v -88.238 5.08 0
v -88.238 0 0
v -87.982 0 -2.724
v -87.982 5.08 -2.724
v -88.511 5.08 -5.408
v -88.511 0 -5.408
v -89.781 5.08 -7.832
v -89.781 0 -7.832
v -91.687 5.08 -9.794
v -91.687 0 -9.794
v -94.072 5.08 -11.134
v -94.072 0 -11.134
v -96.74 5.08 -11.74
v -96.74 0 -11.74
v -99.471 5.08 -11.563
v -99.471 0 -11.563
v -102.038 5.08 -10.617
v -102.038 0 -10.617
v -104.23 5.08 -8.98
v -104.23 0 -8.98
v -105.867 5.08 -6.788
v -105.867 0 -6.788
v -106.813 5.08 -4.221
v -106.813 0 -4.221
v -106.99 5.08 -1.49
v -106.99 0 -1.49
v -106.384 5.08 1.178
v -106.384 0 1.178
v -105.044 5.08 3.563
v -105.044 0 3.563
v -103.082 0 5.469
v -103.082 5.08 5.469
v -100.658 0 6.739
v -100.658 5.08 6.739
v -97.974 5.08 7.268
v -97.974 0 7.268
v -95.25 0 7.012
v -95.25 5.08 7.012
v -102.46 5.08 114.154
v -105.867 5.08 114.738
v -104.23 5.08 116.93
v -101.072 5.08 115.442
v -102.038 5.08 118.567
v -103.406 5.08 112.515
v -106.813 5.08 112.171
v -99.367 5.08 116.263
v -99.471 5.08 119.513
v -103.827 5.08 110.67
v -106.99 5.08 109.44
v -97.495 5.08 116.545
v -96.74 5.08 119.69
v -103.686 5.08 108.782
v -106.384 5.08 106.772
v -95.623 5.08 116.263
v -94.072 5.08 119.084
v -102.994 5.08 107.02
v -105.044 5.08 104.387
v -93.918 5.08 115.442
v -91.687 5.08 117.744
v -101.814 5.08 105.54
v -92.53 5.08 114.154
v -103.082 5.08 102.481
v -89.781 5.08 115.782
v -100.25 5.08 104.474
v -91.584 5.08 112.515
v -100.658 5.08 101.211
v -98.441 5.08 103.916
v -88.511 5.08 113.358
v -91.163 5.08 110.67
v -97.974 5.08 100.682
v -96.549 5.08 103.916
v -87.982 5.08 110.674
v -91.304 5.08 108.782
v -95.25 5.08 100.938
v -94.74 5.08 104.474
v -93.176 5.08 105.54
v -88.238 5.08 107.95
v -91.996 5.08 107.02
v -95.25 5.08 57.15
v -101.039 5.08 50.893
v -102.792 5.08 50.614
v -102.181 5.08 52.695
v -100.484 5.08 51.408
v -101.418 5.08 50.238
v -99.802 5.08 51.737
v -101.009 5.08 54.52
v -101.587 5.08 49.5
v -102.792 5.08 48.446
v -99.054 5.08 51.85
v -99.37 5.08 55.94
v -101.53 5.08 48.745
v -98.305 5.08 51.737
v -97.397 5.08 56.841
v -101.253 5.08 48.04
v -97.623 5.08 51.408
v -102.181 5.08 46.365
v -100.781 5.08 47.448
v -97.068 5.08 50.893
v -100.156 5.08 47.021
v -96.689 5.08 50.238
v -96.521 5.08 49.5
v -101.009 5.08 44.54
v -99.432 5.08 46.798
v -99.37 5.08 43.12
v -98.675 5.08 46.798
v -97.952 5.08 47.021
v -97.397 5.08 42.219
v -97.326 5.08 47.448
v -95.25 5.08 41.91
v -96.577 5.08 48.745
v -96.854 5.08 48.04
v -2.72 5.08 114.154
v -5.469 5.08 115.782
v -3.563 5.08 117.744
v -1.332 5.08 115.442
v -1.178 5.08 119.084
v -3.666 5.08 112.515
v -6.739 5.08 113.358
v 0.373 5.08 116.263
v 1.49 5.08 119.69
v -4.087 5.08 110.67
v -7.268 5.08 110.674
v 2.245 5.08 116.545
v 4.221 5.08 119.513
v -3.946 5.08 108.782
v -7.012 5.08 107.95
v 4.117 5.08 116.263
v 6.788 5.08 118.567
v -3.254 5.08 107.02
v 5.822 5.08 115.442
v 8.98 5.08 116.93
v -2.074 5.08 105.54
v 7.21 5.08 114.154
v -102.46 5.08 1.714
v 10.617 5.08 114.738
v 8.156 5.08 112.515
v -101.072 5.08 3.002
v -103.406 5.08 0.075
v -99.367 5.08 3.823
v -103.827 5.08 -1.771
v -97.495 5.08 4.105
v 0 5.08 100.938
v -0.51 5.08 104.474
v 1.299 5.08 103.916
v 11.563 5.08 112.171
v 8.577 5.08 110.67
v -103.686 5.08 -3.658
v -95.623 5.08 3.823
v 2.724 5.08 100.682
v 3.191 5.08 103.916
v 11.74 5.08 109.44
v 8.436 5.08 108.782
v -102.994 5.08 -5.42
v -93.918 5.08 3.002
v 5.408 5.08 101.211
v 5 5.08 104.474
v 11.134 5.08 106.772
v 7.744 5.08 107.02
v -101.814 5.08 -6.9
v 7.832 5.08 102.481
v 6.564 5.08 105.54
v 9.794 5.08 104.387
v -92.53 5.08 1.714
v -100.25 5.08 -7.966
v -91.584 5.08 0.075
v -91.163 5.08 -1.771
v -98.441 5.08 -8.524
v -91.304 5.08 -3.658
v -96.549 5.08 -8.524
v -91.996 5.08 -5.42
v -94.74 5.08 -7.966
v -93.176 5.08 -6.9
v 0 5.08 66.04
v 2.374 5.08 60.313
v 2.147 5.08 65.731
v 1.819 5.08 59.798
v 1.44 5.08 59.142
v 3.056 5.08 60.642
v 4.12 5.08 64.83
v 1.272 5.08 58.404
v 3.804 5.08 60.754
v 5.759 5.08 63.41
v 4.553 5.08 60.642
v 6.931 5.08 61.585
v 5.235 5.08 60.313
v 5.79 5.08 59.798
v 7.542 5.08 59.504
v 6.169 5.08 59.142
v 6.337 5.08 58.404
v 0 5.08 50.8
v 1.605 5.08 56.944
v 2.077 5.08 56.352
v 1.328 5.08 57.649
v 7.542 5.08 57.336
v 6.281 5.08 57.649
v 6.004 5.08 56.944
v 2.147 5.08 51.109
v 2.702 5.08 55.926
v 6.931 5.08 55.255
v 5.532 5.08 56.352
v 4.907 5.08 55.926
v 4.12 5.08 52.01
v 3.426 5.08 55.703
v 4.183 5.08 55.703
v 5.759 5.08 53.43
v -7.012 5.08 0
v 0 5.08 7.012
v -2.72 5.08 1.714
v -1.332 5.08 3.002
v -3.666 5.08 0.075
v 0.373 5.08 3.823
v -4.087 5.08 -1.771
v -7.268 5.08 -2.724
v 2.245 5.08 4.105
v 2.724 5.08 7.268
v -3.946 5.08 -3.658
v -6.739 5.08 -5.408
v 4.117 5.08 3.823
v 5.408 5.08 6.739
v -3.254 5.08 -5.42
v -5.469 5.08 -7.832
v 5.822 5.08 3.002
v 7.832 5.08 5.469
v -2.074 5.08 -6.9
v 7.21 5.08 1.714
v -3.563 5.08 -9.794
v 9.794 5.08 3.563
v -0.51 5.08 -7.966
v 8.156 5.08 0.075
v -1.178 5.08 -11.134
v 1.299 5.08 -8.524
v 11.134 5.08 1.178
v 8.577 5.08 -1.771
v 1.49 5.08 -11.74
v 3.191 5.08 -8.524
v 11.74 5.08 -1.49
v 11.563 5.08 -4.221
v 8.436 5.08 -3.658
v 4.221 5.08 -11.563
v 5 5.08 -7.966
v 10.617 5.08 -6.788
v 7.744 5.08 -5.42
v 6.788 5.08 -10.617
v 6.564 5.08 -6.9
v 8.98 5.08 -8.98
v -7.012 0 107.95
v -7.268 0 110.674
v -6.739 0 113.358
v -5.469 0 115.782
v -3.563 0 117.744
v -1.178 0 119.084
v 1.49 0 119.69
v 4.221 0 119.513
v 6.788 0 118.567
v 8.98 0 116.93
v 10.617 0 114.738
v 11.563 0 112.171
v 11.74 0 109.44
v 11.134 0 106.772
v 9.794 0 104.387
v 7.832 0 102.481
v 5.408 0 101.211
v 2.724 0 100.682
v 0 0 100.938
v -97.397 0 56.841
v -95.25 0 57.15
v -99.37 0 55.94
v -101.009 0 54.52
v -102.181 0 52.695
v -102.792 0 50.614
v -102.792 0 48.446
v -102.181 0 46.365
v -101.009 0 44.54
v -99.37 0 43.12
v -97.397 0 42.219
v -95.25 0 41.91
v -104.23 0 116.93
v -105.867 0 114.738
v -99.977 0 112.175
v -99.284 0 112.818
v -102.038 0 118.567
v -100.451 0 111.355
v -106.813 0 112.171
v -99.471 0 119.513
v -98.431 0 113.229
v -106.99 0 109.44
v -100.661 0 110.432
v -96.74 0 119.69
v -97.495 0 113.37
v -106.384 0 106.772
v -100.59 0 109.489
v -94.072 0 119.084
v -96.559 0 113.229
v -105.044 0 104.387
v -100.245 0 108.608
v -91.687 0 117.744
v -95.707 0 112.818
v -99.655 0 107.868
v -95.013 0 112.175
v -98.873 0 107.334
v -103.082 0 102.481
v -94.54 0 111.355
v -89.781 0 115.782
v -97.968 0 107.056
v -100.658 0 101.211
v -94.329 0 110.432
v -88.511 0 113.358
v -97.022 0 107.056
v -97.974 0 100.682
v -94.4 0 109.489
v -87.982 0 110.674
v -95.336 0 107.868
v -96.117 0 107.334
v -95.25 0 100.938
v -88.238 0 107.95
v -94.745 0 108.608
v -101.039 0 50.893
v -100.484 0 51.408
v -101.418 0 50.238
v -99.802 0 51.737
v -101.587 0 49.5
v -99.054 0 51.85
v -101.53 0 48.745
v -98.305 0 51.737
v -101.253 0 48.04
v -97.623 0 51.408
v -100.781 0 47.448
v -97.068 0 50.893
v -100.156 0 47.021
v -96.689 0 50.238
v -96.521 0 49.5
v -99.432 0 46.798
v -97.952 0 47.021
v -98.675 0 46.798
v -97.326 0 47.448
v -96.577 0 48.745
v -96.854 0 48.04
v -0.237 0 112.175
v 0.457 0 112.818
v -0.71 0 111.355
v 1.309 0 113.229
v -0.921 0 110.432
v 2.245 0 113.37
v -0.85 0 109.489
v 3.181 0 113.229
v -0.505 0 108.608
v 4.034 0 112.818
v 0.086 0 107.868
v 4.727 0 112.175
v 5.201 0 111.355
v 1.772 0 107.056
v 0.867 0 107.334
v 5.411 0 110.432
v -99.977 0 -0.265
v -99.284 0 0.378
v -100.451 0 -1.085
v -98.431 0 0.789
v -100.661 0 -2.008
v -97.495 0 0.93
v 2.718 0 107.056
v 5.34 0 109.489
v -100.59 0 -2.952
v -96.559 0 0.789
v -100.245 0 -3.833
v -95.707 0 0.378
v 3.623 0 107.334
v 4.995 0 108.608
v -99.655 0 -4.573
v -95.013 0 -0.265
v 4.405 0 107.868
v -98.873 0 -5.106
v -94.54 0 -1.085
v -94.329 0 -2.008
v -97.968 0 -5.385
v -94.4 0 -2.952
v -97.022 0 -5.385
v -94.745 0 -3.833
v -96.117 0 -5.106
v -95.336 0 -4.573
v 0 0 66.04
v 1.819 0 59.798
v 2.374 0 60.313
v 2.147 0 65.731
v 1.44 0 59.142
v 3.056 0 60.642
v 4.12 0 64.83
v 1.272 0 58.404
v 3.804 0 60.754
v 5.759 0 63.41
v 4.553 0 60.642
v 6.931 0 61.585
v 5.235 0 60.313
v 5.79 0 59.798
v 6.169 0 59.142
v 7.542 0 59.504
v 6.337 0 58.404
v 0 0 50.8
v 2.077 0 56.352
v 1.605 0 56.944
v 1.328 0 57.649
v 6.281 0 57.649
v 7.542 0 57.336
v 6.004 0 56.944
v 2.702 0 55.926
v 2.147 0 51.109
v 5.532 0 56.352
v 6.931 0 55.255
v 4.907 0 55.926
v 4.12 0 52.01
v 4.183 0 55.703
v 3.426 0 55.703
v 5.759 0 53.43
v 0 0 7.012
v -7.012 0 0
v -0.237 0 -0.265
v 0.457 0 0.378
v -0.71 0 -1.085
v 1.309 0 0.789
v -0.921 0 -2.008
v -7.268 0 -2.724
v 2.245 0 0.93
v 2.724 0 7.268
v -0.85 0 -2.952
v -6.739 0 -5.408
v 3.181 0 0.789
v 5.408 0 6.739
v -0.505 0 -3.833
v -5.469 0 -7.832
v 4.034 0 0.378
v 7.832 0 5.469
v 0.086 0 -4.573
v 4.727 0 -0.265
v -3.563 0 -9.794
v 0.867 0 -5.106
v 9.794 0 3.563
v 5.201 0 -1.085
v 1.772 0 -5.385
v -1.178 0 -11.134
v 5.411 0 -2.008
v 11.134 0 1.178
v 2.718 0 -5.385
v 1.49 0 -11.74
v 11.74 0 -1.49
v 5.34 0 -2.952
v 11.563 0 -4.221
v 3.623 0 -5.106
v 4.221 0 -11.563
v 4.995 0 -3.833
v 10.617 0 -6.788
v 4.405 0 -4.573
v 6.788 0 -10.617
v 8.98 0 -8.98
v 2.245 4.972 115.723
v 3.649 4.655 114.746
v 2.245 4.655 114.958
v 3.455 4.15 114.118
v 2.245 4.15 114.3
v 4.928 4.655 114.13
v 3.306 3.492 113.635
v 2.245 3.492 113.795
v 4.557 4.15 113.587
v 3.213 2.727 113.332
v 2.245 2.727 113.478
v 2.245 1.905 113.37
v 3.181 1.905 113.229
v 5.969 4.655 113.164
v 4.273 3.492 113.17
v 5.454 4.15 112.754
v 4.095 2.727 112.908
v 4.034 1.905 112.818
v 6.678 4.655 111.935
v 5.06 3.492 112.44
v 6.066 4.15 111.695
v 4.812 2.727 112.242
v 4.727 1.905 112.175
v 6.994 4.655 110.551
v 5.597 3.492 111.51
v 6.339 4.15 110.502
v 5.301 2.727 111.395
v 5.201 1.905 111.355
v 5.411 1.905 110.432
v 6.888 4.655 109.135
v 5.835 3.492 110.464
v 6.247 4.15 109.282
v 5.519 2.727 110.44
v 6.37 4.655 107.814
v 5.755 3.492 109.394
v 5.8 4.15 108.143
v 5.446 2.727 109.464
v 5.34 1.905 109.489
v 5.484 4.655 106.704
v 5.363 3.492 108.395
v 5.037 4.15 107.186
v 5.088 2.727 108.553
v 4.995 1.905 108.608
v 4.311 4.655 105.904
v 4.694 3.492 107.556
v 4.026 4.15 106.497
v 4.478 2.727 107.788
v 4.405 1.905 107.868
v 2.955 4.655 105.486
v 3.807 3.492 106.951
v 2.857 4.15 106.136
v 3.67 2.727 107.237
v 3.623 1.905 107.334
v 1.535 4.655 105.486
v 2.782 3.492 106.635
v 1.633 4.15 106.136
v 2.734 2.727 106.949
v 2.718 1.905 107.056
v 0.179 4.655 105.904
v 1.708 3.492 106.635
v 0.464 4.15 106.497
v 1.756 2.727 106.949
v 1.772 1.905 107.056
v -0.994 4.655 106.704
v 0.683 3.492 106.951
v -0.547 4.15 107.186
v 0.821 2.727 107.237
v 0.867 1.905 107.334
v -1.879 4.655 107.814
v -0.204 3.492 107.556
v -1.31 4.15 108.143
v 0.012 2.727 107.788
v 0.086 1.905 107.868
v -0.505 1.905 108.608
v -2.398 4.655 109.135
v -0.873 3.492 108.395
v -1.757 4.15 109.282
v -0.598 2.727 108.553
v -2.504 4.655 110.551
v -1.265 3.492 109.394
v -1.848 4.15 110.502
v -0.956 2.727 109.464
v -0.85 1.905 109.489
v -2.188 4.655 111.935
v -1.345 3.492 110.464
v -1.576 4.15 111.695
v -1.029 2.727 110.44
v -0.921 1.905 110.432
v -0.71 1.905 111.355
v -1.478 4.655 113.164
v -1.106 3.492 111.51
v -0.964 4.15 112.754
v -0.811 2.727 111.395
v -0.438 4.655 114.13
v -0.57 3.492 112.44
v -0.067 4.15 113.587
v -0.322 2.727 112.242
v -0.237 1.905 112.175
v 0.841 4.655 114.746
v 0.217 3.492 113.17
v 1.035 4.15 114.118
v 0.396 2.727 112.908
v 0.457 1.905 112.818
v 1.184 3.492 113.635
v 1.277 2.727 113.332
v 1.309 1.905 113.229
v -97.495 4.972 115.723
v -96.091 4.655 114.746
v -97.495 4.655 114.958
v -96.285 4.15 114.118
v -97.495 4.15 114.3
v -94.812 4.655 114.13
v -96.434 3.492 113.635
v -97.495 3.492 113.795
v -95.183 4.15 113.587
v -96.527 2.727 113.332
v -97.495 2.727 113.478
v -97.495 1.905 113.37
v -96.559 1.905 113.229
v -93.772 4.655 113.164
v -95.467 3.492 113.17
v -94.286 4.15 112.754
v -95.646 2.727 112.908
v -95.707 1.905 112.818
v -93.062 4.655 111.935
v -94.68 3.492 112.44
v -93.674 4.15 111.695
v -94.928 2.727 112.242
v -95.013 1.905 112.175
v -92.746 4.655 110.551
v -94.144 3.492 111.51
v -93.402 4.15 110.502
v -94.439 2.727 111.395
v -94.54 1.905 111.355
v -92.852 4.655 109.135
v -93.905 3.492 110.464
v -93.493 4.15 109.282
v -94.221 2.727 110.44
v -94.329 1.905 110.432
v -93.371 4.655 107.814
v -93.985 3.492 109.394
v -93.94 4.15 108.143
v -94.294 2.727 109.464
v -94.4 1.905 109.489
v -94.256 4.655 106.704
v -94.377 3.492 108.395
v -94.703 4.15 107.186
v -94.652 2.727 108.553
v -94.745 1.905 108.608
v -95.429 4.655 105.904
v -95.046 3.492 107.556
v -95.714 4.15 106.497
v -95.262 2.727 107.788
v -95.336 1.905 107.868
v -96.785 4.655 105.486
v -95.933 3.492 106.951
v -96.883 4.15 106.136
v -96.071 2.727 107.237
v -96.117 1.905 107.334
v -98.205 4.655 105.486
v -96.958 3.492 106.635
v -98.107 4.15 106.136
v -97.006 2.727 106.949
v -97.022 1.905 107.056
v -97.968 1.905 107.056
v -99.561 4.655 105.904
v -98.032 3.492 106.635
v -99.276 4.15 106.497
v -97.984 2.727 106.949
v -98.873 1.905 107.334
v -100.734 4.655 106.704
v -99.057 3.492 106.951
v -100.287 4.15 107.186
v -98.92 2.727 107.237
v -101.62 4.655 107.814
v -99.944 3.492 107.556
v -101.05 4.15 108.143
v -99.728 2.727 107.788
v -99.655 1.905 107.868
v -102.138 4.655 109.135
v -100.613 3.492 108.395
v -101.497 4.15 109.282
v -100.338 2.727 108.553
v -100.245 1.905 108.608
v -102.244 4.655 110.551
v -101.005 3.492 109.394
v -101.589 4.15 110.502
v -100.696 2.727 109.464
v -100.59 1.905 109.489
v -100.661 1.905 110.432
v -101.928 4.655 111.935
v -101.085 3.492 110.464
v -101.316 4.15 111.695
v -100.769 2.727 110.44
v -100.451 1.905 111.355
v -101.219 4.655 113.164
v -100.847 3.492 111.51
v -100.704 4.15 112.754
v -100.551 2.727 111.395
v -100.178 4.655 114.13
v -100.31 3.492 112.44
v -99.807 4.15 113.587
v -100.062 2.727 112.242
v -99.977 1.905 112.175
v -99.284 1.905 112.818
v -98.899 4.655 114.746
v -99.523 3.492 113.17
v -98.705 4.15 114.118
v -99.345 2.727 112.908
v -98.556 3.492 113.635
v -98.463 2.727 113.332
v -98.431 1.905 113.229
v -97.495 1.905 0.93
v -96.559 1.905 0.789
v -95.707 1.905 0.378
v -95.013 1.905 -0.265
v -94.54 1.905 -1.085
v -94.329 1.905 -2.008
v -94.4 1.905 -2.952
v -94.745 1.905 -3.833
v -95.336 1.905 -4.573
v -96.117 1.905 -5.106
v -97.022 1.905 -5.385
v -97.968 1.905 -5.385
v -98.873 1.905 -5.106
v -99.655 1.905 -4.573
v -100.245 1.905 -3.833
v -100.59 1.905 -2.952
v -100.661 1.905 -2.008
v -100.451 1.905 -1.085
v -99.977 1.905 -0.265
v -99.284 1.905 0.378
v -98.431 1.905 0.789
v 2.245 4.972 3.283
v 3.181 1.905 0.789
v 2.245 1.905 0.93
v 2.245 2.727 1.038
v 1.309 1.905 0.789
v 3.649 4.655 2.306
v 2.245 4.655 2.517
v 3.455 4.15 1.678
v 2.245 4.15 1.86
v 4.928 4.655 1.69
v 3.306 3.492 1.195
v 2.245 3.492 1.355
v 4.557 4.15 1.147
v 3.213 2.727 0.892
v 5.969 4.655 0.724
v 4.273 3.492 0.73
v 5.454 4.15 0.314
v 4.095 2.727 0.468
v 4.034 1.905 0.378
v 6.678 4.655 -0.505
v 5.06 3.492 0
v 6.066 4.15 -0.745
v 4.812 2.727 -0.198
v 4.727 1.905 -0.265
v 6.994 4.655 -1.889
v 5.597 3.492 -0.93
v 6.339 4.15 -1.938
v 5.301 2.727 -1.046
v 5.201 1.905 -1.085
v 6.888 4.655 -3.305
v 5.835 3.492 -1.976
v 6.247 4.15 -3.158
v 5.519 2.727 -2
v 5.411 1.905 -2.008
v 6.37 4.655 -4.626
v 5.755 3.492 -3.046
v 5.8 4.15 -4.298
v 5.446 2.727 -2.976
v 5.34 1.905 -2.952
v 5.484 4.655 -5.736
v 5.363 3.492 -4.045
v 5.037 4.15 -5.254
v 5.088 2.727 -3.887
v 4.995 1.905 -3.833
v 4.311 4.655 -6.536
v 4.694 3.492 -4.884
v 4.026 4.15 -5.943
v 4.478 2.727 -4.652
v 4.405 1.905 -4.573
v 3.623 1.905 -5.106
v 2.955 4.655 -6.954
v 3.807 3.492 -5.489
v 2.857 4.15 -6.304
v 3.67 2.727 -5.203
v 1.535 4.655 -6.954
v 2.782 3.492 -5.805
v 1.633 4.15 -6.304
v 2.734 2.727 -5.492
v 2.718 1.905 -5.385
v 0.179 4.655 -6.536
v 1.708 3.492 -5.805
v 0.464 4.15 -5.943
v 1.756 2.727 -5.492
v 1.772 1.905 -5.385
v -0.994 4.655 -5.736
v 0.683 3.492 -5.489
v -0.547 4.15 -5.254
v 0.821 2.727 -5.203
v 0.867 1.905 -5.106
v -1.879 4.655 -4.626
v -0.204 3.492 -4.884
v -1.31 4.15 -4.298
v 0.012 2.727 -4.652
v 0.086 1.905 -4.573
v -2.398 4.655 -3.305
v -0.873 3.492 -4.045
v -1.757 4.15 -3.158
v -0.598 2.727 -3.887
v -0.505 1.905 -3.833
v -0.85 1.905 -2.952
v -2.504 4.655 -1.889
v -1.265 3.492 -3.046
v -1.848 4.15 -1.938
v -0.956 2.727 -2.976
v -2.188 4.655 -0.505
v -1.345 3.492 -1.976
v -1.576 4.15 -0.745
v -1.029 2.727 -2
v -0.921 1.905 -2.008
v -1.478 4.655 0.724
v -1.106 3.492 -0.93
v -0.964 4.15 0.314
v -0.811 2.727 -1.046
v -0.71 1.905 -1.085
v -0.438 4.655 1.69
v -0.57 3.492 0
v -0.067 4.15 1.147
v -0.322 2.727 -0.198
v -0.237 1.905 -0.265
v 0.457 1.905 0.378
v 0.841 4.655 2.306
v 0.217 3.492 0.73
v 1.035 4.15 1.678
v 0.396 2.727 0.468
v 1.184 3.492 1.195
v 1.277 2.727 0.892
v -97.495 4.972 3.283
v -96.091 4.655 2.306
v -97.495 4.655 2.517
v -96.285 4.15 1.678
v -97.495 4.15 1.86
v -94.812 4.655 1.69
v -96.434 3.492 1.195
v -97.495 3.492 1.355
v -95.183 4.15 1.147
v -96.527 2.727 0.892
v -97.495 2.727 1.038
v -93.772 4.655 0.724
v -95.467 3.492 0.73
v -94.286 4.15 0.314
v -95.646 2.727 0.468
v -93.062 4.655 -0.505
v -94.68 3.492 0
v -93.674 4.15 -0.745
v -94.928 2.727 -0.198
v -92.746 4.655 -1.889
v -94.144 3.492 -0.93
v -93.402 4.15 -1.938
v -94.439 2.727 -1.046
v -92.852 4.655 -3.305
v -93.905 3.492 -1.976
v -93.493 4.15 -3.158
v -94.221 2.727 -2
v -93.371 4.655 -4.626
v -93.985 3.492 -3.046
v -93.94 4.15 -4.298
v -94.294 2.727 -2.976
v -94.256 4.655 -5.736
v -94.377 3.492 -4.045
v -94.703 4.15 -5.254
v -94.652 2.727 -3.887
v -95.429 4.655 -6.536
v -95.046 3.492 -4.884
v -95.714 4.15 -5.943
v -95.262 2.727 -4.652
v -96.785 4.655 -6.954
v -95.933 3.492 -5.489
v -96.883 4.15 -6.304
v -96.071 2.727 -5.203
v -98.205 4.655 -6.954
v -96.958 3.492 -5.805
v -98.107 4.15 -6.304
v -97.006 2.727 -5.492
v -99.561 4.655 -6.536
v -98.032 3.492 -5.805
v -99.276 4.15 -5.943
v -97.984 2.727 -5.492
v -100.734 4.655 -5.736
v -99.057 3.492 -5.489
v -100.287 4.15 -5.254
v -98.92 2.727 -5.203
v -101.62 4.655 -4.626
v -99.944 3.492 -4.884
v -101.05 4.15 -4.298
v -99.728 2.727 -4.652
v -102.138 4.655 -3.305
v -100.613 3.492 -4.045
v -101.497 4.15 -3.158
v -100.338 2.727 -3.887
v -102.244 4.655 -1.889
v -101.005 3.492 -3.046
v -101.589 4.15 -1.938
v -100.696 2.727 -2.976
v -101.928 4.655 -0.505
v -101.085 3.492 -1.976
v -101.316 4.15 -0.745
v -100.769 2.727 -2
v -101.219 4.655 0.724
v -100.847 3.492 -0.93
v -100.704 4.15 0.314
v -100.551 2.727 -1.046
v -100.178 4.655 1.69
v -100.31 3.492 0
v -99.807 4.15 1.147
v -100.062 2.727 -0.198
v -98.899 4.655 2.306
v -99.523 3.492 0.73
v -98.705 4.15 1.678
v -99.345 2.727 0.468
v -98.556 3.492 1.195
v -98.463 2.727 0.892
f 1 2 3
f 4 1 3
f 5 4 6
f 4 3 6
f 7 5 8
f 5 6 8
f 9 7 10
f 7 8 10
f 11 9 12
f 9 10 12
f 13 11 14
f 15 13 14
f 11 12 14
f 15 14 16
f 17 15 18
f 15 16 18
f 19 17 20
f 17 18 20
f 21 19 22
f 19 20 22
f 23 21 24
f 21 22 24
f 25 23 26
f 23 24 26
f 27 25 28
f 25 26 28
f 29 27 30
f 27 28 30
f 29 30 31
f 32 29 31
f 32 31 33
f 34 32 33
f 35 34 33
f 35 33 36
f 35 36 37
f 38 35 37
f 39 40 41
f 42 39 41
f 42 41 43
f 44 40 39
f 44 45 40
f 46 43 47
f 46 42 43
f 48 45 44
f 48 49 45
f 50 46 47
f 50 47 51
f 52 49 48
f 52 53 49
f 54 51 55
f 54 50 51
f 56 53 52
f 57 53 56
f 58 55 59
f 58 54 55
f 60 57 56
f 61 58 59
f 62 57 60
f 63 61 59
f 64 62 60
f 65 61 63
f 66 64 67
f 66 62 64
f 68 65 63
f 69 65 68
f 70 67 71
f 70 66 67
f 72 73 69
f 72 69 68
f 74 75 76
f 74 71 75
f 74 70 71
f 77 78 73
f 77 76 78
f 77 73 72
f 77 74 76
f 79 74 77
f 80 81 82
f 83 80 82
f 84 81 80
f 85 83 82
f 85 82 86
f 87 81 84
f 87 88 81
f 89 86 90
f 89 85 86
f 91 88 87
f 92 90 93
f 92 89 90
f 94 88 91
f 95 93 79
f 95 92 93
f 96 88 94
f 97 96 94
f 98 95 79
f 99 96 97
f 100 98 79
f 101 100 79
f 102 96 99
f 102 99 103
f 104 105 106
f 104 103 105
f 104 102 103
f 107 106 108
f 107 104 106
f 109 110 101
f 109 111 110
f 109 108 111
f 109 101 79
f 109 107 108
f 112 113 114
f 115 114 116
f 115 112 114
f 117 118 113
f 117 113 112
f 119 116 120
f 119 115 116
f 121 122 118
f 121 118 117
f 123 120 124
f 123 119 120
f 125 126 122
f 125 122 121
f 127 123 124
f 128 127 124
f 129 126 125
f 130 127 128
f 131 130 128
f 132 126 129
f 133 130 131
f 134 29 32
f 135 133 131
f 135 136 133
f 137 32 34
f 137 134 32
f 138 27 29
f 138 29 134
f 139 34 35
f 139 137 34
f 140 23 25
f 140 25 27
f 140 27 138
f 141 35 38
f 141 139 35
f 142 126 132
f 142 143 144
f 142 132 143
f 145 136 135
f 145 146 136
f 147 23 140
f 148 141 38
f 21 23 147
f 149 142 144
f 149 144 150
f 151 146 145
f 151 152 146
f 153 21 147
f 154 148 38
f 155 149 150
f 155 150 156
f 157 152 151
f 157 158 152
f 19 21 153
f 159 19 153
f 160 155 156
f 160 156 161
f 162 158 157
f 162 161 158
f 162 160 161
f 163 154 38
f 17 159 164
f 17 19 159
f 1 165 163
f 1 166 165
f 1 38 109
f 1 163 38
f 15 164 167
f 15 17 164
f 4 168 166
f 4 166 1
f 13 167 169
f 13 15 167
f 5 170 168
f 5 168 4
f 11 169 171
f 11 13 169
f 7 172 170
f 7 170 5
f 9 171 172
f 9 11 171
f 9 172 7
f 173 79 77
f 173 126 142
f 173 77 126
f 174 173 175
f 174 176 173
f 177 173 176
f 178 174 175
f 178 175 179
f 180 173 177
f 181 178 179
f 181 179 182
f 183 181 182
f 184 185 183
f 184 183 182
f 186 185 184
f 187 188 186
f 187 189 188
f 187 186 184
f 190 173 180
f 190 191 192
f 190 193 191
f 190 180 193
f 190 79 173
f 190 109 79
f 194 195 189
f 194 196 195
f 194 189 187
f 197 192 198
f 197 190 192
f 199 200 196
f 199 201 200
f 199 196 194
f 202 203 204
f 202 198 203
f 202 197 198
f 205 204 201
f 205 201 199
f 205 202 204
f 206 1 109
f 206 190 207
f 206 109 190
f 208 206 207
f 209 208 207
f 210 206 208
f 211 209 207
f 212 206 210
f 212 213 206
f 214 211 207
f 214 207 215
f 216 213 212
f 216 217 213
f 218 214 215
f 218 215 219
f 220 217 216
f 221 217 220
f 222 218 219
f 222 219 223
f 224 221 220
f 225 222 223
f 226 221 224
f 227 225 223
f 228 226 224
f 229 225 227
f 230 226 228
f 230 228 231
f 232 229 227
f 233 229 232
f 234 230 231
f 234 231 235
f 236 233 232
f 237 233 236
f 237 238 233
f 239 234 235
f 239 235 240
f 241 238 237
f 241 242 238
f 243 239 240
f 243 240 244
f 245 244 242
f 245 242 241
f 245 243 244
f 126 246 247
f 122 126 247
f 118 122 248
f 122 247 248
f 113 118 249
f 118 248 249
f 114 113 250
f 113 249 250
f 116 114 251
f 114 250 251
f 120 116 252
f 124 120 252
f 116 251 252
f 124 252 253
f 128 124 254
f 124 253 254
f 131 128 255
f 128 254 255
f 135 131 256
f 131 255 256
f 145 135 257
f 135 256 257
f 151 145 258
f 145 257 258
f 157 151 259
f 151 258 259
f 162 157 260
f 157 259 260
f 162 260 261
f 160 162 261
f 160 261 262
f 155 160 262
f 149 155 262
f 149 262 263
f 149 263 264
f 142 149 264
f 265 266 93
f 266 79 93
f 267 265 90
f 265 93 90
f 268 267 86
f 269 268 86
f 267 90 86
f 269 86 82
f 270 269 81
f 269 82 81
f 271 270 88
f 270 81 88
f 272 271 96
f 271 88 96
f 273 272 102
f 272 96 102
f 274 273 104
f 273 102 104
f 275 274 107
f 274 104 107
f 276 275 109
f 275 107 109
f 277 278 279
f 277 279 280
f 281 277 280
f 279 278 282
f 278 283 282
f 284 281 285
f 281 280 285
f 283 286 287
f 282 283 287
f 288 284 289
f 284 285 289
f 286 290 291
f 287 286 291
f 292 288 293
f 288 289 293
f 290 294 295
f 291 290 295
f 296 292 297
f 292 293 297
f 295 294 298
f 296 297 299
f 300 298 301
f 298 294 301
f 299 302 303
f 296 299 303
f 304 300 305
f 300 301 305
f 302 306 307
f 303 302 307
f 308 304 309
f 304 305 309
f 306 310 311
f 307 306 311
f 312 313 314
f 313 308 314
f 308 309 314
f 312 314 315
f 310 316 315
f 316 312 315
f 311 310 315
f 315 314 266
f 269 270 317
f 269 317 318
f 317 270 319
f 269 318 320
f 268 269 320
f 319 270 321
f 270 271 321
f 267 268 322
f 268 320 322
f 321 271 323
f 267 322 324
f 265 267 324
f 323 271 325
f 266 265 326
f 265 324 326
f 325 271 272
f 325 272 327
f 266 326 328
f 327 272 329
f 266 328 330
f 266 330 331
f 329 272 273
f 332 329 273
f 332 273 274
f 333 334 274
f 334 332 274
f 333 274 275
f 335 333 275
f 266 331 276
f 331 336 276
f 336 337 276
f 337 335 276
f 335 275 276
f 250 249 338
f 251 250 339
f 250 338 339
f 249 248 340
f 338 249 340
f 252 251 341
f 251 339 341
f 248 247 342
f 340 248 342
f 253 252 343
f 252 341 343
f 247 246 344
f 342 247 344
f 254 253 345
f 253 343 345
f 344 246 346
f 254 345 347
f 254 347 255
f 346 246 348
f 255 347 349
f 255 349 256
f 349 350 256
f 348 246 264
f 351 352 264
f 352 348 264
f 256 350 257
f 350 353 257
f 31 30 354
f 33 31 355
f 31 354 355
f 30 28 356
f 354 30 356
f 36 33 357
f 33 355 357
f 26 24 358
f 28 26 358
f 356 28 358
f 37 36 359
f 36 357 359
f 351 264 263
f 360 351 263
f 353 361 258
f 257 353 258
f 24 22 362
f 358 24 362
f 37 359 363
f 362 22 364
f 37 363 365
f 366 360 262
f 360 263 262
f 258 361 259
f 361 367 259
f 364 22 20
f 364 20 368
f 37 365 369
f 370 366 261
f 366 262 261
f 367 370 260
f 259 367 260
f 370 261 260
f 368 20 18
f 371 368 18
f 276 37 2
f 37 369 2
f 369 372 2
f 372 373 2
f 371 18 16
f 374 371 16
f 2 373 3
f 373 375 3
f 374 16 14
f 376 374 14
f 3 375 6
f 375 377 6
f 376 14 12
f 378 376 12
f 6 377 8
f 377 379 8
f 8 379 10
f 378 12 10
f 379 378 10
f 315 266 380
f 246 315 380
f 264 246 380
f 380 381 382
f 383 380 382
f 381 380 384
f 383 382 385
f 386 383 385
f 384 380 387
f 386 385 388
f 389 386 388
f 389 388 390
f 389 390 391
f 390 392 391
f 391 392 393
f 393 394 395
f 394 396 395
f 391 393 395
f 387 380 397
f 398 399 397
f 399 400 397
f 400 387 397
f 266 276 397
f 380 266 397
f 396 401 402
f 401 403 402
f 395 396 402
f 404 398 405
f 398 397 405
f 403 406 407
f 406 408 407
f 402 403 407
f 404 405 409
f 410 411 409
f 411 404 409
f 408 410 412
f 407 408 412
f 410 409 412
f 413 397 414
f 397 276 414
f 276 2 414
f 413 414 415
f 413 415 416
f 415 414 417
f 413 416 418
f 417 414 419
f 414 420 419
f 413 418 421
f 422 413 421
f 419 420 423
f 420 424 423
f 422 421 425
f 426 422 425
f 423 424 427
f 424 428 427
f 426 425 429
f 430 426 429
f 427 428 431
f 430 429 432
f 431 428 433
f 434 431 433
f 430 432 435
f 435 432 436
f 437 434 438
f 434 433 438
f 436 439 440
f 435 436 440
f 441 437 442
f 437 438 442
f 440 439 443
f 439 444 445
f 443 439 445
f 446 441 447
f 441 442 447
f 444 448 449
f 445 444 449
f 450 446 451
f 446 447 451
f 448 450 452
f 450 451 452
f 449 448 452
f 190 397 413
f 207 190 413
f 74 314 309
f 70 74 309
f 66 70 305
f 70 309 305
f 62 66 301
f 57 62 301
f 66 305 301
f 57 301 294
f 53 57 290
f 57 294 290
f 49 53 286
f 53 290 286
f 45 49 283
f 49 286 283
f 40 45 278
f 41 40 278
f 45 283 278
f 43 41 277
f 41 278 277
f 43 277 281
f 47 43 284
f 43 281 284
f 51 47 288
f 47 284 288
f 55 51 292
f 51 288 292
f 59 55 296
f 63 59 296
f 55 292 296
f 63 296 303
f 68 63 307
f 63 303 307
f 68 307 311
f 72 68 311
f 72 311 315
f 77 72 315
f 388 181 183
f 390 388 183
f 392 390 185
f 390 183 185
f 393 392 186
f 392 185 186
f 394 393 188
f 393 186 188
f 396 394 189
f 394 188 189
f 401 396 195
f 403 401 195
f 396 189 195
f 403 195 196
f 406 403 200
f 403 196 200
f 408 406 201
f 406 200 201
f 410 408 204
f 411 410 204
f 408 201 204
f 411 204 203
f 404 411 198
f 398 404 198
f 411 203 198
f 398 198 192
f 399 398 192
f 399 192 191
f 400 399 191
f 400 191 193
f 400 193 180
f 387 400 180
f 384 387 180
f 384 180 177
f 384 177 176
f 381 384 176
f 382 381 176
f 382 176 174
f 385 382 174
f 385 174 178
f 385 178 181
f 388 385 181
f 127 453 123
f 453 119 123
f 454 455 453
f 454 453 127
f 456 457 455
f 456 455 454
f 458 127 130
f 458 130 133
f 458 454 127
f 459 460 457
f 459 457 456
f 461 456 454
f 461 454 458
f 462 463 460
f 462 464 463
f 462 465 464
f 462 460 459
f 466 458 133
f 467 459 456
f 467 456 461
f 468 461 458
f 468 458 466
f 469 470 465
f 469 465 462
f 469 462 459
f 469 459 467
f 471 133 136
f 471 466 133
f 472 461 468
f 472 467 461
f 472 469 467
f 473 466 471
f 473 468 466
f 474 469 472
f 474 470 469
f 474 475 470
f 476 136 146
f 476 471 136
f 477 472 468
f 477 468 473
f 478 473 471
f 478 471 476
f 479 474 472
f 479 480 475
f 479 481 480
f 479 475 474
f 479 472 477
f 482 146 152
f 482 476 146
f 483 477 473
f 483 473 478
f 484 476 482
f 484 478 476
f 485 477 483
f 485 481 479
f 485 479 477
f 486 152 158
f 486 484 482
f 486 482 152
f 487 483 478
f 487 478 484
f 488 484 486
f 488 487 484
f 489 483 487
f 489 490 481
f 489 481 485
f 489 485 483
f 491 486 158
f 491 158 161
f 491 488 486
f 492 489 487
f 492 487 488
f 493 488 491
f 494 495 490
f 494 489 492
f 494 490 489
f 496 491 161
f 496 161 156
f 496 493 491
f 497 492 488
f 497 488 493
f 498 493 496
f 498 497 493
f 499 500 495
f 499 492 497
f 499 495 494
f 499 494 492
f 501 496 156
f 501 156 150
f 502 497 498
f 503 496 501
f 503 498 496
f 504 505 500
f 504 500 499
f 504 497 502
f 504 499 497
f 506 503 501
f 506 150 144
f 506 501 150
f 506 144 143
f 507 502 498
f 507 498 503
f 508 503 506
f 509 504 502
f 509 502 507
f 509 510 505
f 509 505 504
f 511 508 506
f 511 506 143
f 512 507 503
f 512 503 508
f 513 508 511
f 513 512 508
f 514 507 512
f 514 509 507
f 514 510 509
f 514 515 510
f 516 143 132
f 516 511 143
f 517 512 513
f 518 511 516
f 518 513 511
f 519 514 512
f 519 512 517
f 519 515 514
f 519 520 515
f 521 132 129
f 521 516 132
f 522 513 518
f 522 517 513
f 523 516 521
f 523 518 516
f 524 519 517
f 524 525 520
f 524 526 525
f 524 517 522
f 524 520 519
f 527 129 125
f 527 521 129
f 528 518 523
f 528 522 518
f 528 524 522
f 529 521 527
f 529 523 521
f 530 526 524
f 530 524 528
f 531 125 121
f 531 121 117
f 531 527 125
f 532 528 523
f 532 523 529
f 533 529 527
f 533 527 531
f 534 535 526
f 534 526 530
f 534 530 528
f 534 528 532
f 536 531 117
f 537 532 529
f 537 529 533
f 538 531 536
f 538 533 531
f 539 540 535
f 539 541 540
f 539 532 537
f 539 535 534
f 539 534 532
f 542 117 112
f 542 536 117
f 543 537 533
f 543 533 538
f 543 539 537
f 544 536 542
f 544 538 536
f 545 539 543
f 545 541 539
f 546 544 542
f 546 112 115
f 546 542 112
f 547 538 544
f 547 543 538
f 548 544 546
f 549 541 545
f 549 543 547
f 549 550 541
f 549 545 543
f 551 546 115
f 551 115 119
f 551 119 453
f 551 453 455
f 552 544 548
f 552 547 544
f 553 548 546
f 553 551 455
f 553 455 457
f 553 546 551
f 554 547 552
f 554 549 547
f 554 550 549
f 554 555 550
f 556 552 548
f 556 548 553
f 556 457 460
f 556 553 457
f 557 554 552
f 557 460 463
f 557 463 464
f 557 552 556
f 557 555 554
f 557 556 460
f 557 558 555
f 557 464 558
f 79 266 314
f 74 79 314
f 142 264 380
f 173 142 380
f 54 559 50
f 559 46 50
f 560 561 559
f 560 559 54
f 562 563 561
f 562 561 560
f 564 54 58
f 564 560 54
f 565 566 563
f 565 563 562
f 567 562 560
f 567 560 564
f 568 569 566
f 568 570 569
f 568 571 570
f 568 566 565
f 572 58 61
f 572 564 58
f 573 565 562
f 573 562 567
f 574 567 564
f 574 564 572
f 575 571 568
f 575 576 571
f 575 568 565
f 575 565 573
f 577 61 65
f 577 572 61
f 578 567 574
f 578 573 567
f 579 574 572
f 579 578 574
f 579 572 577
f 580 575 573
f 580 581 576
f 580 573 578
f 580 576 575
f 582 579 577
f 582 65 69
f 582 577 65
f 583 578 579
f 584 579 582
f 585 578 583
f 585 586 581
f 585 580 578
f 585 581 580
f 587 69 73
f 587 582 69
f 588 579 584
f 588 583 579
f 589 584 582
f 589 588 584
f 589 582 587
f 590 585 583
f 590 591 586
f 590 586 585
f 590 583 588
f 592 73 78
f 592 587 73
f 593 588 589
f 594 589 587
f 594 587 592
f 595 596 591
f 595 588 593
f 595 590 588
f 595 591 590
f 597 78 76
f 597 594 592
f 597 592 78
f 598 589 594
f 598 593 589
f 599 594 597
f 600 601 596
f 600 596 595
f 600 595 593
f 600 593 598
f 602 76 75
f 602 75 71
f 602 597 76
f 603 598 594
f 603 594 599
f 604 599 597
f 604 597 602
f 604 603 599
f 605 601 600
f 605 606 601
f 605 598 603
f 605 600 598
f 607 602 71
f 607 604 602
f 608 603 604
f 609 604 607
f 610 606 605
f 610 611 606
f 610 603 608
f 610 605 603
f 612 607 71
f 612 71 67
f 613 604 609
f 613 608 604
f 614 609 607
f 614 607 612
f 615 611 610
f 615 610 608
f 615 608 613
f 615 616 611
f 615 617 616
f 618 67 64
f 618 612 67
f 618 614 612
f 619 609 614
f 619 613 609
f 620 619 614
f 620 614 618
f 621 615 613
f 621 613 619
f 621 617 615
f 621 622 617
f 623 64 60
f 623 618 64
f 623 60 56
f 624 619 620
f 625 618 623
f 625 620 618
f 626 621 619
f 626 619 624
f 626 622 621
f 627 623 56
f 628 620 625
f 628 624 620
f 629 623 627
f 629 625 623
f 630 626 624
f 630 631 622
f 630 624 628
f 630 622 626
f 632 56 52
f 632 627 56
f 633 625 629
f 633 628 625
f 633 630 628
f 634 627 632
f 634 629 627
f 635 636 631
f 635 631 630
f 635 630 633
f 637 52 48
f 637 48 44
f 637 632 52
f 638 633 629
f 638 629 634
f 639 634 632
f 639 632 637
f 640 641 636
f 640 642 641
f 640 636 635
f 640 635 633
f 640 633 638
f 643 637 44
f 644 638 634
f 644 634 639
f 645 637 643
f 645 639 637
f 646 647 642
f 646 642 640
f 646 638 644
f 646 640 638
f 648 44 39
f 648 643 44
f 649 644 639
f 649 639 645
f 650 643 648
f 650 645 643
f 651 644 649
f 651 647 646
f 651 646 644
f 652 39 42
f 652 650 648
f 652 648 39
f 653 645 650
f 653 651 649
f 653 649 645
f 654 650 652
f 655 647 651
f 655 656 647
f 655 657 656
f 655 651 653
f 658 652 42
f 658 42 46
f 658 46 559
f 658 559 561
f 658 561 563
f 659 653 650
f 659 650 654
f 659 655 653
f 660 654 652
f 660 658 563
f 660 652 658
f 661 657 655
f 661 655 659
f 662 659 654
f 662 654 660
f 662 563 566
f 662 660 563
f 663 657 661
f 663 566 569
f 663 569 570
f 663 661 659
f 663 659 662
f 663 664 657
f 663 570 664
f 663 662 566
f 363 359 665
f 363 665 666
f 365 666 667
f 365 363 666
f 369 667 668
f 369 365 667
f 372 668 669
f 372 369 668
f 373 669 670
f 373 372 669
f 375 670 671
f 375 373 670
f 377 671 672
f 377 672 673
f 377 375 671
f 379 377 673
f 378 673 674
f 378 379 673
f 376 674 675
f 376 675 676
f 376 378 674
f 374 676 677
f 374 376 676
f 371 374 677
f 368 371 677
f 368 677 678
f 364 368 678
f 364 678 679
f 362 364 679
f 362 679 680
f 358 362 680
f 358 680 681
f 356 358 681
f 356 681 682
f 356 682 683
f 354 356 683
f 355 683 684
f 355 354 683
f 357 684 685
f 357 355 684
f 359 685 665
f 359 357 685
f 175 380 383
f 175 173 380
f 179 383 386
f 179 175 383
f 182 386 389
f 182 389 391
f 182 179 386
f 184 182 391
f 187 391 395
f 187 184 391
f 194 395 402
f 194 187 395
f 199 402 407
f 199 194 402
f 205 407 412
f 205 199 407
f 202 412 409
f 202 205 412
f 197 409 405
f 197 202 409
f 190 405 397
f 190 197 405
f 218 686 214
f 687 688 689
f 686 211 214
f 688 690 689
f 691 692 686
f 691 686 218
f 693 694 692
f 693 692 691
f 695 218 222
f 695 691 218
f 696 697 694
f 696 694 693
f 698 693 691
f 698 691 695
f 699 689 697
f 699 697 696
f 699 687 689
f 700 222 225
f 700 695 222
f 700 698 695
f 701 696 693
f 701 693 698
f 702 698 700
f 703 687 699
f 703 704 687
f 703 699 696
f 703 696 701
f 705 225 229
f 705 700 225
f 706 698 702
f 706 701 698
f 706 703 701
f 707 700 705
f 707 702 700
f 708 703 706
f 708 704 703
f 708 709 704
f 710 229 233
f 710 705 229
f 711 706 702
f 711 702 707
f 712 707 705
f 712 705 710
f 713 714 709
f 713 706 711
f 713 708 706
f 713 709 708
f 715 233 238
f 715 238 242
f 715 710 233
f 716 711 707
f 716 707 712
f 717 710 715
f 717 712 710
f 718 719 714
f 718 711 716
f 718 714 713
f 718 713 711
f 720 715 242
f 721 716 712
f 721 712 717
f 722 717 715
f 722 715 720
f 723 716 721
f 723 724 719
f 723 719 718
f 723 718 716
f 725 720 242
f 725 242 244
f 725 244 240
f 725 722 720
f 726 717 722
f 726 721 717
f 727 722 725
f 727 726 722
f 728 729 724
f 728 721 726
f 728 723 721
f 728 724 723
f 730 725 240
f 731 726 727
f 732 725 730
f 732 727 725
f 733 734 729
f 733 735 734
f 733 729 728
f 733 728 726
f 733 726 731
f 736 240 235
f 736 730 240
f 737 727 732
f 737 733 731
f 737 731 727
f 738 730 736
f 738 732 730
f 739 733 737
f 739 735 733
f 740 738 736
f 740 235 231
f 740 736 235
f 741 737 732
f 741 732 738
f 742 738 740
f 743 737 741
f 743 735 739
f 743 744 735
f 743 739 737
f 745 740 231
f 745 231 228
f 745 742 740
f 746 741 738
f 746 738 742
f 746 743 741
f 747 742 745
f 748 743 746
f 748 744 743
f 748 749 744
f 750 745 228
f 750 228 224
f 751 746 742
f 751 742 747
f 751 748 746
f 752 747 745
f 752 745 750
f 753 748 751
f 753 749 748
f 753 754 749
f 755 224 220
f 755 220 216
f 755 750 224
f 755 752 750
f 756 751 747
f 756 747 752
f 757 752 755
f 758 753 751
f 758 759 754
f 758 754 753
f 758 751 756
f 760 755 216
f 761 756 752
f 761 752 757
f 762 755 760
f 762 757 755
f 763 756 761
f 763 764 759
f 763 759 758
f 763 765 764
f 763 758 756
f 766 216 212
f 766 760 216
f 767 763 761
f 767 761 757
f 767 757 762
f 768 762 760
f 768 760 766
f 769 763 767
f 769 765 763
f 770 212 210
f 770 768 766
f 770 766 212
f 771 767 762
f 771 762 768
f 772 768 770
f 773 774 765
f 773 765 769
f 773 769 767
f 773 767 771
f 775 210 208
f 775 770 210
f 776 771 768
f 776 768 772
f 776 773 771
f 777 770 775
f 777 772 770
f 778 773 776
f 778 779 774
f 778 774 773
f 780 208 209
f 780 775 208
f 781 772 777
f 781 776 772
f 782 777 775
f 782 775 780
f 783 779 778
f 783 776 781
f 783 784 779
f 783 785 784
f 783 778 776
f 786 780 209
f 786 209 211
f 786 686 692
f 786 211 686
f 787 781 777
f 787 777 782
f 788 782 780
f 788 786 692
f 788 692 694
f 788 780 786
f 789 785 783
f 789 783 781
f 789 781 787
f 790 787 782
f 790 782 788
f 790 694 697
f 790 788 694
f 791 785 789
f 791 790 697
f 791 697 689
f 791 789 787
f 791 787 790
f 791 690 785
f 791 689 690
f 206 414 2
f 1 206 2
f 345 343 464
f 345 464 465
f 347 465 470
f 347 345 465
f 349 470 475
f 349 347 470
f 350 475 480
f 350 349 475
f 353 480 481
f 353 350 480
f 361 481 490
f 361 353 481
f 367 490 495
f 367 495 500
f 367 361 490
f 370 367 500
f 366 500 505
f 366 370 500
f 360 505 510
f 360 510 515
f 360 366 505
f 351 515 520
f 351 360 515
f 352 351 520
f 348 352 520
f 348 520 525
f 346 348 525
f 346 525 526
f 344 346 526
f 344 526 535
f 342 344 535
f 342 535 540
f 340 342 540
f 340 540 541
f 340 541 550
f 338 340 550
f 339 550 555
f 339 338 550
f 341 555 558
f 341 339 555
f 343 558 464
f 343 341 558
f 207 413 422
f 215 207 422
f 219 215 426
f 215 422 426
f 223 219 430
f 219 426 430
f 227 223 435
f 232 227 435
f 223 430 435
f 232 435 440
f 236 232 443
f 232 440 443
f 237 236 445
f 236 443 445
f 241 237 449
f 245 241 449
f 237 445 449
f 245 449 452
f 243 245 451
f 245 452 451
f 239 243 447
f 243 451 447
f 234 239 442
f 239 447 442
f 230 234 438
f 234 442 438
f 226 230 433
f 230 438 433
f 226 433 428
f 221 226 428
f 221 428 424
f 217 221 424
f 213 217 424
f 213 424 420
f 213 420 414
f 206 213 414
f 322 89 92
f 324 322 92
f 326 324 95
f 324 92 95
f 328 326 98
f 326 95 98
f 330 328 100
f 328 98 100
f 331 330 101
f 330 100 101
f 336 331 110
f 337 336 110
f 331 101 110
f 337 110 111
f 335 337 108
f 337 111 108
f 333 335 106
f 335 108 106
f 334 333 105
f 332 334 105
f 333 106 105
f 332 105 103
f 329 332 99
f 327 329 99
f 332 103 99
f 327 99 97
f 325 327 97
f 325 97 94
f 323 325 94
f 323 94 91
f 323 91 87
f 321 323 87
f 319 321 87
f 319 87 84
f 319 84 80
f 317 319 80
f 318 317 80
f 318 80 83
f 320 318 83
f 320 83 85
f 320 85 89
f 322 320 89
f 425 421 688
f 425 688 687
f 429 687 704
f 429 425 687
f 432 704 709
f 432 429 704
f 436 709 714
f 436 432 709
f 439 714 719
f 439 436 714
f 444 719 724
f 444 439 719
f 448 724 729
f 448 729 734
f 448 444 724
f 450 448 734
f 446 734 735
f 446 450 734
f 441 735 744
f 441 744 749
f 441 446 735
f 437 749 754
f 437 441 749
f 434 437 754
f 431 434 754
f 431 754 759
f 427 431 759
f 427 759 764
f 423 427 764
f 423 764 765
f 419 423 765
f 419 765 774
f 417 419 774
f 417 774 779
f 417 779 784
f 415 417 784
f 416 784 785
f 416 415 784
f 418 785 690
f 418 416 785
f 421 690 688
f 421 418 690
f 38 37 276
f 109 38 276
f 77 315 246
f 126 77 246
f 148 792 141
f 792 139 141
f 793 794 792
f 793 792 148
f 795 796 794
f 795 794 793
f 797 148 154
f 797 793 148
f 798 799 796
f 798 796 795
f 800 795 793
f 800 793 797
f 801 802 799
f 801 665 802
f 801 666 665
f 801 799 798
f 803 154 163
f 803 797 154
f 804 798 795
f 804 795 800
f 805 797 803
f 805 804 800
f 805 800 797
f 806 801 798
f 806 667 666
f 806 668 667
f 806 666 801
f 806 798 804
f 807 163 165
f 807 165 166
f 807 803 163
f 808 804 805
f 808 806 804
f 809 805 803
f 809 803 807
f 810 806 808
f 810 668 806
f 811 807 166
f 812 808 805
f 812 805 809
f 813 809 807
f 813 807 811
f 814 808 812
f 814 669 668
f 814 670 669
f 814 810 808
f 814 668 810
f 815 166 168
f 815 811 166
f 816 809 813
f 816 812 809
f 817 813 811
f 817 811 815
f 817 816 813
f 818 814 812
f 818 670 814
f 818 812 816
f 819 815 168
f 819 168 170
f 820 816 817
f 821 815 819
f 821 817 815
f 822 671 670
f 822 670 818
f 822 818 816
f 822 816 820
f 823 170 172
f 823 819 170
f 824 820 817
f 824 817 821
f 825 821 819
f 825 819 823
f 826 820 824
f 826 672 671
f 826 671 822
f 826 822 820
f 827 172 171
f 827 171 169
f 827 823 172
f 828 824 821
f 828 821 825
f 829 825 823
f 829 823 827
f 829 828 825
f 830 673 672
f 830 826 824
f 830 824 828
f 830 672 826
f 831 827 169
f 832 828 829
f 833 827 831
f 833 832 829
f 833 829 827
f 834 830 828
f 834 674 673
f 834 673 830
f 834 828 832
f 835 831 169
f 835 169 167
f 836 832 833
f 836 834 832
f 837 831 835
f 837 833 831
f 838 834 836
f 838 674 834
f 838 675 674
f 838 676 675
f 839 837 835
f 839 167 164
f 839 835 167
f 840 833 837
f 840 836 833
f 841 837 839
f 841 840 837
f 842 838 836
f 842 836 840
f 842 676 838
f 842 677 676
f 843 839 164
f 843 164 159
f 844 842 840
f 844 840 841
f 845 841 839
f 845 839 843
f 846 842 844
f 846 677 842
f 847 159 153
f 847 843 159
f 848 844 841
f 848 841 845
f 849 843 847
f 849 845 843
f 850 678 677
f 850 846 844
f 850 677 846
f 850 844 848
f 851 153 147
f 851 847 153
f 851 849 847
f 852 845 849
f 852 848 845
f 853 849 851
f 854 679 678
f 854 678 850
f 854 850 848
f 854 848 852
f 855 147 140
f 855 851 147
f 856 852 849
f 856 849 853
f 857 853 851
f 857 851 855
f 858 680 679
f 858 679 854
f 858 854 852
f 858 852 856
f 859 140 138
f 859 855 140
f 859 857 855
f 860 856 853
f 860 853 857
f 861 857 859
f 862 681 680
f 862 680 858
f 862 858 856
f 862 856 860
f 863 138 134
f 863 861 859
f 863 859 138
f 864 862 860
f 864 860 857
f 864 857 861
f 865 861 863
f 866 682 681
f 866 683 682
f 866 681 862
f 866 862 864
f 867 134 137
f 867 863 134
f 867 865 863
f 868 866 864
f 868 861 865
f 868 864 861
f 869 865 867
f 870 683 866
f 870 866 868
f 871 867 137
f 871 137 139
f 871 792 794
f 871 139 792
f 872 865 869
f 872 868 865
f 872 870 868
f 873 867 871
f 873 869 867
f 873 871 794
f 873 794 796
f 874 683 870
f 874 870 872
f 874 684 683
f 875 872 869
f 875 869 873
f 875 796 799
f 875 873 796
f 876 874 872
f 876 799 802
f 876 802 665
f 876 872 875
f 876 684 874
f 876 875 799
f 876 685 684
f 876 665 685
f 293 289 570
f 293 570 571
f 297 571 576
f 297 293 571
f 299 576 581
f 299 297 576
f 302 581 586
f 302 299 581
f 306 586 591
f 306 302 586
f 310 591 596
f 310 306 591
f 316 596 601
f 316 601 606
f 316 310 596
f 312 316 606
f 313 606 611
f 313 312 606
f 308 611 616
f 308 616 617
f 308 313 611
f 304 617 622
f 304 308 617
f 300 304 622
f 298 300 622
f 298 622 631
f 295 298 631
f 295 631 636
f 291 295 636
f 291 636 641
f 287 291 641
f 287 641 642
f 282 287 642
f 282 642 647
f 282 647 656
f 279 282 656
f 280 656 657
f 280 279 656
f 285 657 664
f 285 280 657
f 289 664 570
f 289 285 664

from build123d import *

# Parameters (mm, degrees)
SKETCH1_R           = 3.175
BOSS_EXTRUDE1_DEPTH = 5.08
SKETCH2_W           = 7.62
SKETCH2_H           = 5.08
REVOLVE1_ANGLE      = 180
SKETCH3_W           = 7.62
SKETCH3_H           = 5.08
REVOLVE2_ANGLE      = 180
SKETCH4_R           = 2.54
CUT_EXTRUDE1_DEPTH  = 161.661116131
SKETCH5_R           = 2.54
CUT_EXTRUDE2_DEPTH  = 161.661116131
FILLET1_R           = 3.175


with BuildPart() as part:
    # Sketch1 → Boss-Extrude1 (new body)
    with BuildSketch(Plane(origin=(0, 0, 0), x_dir=(1, 0, 0), z_dir=(0, 1, 0))):
        with BuildLine():
            Line((-7.011572103, 0), (-88.238427897, 0))
            ThreePointArc((-88.238427897, 0), (-104.230256121, 8.980256121), (-95.25, -7.011572103))
            Line((-95.25, -7.011572103), (-95.25, -100.938427897))
            ThreePointArc((-95.25, -100.938427897), (-104.230256121, -116.930256121), (-88.238427897, -107.95))
            Line((-88.238427897, -107.95), (-7.011572103, -107.95))
            ThreePointArc((-7.011572103, -107.95), (8.980256121, -116.930256121), (0, -100.938427897))
            Line((0, -100.938427897), (0, -7.011572103))
            ThreePointArc((0, -7.011572103), (8.980256121, 8.980256121), (-7.011572103, 0))
        make_face()
        with Locations(Location((-97.49506403, 2.24506403, 0), (0, 0, 270))):
            Circle(SKETCH1_R, mode=Mode.SUBTRACT)
        with Locations(Location((2.24506403, 2.24506403, 0), (0, 0, 270))):
            Circle(SKETCH1_R, mode=Mode.SUBTRACT)
        with Locations(Location((2.24506403, -110.19506403, 0), (0, 0, 270))):
            Circle(SKETCH1_R, mode=Mode.SUBTRACT)
        with Locations(Location((-97.49506403, -110.19506403, 0), (0, 0, 270))):
            Circle(SKETCH1_R, mode=Mode.SUBTRACT)
    extrude(amount=BOSS_EXTRUDE1_DEPTH)

    # Sketch2 → Revolve1 (revolve)
    with BuildSketch(Plane.ZY.offset(95.25)):
        with Locations((53.34, 2.54)):
            Rectangle(SKETCH2_W, SKETCH2_H)
    revolve(axis=Axis((-95.25, 5.08, 49.53), (0, -1, 0)), revolution_arc=REVOLVE1_ANGLE)

    # Sketch3 → Revolve2 (revolve)
    with BuildSketch(Plane(origin=(0, 0, 0), x_dir=(0, 0, -1), z_dir=(1, 0, 0))):
        with Locations((-62.23, 2.54)):
            Rectangle(SKETCH3_W, SKETCH3_H)
    revolve(axis=Axis((0, 5.08, 58.42), (0, 1, 0)), revolution_arc=REVOLVE2_ANGLE)

    # Sketch4 → Cut-Extrude1 (cut, through all)
    with BuildSketch(Plane(origin=(0, 5.08, 0), x_dir=(1, 0, 0), z_dir=(0, 1, 0))):
        with Locations(Location((-99.053632383, -49.309816677, 0), (0, 0, 270))):
            Circle(SKETCH4_R)
    extrude(amount=-CUT_EXTRUDE1_DEPTH, mode=Mode.SUBTRACT)

    # Sketch5 → Cut-Extrude2 (cut, through all)
    with BuildSketch(Plane(origin=(0, 5.08, 0), x_dir=(1, 0, 0), z_dir=(0, 1, 0))):
        with Locations(Location((3.804450658, -58.214439329, 0), (0, 0, 270))):
            Circle(SKETCH5_R)
    extrude(amount=-CUT_EXTRUDE2_DEPTH, mode=Mode.SUBTRACT)

    # Fillet1
    fillet1_edges = [part.edges().sort_by_distance(p)[0] for p in [
        (-97.49506403, 5.08, -5.42006403),
        (2.24506403, 5.08, -5.42006403),
        (2.24506403, 5.08, 107.02006403),
        (-97.49506403, 5.08, 107.02006403),
    ]]
    fillet(fillet1_edges, radius=FILLET1_R)


solid = part.part
